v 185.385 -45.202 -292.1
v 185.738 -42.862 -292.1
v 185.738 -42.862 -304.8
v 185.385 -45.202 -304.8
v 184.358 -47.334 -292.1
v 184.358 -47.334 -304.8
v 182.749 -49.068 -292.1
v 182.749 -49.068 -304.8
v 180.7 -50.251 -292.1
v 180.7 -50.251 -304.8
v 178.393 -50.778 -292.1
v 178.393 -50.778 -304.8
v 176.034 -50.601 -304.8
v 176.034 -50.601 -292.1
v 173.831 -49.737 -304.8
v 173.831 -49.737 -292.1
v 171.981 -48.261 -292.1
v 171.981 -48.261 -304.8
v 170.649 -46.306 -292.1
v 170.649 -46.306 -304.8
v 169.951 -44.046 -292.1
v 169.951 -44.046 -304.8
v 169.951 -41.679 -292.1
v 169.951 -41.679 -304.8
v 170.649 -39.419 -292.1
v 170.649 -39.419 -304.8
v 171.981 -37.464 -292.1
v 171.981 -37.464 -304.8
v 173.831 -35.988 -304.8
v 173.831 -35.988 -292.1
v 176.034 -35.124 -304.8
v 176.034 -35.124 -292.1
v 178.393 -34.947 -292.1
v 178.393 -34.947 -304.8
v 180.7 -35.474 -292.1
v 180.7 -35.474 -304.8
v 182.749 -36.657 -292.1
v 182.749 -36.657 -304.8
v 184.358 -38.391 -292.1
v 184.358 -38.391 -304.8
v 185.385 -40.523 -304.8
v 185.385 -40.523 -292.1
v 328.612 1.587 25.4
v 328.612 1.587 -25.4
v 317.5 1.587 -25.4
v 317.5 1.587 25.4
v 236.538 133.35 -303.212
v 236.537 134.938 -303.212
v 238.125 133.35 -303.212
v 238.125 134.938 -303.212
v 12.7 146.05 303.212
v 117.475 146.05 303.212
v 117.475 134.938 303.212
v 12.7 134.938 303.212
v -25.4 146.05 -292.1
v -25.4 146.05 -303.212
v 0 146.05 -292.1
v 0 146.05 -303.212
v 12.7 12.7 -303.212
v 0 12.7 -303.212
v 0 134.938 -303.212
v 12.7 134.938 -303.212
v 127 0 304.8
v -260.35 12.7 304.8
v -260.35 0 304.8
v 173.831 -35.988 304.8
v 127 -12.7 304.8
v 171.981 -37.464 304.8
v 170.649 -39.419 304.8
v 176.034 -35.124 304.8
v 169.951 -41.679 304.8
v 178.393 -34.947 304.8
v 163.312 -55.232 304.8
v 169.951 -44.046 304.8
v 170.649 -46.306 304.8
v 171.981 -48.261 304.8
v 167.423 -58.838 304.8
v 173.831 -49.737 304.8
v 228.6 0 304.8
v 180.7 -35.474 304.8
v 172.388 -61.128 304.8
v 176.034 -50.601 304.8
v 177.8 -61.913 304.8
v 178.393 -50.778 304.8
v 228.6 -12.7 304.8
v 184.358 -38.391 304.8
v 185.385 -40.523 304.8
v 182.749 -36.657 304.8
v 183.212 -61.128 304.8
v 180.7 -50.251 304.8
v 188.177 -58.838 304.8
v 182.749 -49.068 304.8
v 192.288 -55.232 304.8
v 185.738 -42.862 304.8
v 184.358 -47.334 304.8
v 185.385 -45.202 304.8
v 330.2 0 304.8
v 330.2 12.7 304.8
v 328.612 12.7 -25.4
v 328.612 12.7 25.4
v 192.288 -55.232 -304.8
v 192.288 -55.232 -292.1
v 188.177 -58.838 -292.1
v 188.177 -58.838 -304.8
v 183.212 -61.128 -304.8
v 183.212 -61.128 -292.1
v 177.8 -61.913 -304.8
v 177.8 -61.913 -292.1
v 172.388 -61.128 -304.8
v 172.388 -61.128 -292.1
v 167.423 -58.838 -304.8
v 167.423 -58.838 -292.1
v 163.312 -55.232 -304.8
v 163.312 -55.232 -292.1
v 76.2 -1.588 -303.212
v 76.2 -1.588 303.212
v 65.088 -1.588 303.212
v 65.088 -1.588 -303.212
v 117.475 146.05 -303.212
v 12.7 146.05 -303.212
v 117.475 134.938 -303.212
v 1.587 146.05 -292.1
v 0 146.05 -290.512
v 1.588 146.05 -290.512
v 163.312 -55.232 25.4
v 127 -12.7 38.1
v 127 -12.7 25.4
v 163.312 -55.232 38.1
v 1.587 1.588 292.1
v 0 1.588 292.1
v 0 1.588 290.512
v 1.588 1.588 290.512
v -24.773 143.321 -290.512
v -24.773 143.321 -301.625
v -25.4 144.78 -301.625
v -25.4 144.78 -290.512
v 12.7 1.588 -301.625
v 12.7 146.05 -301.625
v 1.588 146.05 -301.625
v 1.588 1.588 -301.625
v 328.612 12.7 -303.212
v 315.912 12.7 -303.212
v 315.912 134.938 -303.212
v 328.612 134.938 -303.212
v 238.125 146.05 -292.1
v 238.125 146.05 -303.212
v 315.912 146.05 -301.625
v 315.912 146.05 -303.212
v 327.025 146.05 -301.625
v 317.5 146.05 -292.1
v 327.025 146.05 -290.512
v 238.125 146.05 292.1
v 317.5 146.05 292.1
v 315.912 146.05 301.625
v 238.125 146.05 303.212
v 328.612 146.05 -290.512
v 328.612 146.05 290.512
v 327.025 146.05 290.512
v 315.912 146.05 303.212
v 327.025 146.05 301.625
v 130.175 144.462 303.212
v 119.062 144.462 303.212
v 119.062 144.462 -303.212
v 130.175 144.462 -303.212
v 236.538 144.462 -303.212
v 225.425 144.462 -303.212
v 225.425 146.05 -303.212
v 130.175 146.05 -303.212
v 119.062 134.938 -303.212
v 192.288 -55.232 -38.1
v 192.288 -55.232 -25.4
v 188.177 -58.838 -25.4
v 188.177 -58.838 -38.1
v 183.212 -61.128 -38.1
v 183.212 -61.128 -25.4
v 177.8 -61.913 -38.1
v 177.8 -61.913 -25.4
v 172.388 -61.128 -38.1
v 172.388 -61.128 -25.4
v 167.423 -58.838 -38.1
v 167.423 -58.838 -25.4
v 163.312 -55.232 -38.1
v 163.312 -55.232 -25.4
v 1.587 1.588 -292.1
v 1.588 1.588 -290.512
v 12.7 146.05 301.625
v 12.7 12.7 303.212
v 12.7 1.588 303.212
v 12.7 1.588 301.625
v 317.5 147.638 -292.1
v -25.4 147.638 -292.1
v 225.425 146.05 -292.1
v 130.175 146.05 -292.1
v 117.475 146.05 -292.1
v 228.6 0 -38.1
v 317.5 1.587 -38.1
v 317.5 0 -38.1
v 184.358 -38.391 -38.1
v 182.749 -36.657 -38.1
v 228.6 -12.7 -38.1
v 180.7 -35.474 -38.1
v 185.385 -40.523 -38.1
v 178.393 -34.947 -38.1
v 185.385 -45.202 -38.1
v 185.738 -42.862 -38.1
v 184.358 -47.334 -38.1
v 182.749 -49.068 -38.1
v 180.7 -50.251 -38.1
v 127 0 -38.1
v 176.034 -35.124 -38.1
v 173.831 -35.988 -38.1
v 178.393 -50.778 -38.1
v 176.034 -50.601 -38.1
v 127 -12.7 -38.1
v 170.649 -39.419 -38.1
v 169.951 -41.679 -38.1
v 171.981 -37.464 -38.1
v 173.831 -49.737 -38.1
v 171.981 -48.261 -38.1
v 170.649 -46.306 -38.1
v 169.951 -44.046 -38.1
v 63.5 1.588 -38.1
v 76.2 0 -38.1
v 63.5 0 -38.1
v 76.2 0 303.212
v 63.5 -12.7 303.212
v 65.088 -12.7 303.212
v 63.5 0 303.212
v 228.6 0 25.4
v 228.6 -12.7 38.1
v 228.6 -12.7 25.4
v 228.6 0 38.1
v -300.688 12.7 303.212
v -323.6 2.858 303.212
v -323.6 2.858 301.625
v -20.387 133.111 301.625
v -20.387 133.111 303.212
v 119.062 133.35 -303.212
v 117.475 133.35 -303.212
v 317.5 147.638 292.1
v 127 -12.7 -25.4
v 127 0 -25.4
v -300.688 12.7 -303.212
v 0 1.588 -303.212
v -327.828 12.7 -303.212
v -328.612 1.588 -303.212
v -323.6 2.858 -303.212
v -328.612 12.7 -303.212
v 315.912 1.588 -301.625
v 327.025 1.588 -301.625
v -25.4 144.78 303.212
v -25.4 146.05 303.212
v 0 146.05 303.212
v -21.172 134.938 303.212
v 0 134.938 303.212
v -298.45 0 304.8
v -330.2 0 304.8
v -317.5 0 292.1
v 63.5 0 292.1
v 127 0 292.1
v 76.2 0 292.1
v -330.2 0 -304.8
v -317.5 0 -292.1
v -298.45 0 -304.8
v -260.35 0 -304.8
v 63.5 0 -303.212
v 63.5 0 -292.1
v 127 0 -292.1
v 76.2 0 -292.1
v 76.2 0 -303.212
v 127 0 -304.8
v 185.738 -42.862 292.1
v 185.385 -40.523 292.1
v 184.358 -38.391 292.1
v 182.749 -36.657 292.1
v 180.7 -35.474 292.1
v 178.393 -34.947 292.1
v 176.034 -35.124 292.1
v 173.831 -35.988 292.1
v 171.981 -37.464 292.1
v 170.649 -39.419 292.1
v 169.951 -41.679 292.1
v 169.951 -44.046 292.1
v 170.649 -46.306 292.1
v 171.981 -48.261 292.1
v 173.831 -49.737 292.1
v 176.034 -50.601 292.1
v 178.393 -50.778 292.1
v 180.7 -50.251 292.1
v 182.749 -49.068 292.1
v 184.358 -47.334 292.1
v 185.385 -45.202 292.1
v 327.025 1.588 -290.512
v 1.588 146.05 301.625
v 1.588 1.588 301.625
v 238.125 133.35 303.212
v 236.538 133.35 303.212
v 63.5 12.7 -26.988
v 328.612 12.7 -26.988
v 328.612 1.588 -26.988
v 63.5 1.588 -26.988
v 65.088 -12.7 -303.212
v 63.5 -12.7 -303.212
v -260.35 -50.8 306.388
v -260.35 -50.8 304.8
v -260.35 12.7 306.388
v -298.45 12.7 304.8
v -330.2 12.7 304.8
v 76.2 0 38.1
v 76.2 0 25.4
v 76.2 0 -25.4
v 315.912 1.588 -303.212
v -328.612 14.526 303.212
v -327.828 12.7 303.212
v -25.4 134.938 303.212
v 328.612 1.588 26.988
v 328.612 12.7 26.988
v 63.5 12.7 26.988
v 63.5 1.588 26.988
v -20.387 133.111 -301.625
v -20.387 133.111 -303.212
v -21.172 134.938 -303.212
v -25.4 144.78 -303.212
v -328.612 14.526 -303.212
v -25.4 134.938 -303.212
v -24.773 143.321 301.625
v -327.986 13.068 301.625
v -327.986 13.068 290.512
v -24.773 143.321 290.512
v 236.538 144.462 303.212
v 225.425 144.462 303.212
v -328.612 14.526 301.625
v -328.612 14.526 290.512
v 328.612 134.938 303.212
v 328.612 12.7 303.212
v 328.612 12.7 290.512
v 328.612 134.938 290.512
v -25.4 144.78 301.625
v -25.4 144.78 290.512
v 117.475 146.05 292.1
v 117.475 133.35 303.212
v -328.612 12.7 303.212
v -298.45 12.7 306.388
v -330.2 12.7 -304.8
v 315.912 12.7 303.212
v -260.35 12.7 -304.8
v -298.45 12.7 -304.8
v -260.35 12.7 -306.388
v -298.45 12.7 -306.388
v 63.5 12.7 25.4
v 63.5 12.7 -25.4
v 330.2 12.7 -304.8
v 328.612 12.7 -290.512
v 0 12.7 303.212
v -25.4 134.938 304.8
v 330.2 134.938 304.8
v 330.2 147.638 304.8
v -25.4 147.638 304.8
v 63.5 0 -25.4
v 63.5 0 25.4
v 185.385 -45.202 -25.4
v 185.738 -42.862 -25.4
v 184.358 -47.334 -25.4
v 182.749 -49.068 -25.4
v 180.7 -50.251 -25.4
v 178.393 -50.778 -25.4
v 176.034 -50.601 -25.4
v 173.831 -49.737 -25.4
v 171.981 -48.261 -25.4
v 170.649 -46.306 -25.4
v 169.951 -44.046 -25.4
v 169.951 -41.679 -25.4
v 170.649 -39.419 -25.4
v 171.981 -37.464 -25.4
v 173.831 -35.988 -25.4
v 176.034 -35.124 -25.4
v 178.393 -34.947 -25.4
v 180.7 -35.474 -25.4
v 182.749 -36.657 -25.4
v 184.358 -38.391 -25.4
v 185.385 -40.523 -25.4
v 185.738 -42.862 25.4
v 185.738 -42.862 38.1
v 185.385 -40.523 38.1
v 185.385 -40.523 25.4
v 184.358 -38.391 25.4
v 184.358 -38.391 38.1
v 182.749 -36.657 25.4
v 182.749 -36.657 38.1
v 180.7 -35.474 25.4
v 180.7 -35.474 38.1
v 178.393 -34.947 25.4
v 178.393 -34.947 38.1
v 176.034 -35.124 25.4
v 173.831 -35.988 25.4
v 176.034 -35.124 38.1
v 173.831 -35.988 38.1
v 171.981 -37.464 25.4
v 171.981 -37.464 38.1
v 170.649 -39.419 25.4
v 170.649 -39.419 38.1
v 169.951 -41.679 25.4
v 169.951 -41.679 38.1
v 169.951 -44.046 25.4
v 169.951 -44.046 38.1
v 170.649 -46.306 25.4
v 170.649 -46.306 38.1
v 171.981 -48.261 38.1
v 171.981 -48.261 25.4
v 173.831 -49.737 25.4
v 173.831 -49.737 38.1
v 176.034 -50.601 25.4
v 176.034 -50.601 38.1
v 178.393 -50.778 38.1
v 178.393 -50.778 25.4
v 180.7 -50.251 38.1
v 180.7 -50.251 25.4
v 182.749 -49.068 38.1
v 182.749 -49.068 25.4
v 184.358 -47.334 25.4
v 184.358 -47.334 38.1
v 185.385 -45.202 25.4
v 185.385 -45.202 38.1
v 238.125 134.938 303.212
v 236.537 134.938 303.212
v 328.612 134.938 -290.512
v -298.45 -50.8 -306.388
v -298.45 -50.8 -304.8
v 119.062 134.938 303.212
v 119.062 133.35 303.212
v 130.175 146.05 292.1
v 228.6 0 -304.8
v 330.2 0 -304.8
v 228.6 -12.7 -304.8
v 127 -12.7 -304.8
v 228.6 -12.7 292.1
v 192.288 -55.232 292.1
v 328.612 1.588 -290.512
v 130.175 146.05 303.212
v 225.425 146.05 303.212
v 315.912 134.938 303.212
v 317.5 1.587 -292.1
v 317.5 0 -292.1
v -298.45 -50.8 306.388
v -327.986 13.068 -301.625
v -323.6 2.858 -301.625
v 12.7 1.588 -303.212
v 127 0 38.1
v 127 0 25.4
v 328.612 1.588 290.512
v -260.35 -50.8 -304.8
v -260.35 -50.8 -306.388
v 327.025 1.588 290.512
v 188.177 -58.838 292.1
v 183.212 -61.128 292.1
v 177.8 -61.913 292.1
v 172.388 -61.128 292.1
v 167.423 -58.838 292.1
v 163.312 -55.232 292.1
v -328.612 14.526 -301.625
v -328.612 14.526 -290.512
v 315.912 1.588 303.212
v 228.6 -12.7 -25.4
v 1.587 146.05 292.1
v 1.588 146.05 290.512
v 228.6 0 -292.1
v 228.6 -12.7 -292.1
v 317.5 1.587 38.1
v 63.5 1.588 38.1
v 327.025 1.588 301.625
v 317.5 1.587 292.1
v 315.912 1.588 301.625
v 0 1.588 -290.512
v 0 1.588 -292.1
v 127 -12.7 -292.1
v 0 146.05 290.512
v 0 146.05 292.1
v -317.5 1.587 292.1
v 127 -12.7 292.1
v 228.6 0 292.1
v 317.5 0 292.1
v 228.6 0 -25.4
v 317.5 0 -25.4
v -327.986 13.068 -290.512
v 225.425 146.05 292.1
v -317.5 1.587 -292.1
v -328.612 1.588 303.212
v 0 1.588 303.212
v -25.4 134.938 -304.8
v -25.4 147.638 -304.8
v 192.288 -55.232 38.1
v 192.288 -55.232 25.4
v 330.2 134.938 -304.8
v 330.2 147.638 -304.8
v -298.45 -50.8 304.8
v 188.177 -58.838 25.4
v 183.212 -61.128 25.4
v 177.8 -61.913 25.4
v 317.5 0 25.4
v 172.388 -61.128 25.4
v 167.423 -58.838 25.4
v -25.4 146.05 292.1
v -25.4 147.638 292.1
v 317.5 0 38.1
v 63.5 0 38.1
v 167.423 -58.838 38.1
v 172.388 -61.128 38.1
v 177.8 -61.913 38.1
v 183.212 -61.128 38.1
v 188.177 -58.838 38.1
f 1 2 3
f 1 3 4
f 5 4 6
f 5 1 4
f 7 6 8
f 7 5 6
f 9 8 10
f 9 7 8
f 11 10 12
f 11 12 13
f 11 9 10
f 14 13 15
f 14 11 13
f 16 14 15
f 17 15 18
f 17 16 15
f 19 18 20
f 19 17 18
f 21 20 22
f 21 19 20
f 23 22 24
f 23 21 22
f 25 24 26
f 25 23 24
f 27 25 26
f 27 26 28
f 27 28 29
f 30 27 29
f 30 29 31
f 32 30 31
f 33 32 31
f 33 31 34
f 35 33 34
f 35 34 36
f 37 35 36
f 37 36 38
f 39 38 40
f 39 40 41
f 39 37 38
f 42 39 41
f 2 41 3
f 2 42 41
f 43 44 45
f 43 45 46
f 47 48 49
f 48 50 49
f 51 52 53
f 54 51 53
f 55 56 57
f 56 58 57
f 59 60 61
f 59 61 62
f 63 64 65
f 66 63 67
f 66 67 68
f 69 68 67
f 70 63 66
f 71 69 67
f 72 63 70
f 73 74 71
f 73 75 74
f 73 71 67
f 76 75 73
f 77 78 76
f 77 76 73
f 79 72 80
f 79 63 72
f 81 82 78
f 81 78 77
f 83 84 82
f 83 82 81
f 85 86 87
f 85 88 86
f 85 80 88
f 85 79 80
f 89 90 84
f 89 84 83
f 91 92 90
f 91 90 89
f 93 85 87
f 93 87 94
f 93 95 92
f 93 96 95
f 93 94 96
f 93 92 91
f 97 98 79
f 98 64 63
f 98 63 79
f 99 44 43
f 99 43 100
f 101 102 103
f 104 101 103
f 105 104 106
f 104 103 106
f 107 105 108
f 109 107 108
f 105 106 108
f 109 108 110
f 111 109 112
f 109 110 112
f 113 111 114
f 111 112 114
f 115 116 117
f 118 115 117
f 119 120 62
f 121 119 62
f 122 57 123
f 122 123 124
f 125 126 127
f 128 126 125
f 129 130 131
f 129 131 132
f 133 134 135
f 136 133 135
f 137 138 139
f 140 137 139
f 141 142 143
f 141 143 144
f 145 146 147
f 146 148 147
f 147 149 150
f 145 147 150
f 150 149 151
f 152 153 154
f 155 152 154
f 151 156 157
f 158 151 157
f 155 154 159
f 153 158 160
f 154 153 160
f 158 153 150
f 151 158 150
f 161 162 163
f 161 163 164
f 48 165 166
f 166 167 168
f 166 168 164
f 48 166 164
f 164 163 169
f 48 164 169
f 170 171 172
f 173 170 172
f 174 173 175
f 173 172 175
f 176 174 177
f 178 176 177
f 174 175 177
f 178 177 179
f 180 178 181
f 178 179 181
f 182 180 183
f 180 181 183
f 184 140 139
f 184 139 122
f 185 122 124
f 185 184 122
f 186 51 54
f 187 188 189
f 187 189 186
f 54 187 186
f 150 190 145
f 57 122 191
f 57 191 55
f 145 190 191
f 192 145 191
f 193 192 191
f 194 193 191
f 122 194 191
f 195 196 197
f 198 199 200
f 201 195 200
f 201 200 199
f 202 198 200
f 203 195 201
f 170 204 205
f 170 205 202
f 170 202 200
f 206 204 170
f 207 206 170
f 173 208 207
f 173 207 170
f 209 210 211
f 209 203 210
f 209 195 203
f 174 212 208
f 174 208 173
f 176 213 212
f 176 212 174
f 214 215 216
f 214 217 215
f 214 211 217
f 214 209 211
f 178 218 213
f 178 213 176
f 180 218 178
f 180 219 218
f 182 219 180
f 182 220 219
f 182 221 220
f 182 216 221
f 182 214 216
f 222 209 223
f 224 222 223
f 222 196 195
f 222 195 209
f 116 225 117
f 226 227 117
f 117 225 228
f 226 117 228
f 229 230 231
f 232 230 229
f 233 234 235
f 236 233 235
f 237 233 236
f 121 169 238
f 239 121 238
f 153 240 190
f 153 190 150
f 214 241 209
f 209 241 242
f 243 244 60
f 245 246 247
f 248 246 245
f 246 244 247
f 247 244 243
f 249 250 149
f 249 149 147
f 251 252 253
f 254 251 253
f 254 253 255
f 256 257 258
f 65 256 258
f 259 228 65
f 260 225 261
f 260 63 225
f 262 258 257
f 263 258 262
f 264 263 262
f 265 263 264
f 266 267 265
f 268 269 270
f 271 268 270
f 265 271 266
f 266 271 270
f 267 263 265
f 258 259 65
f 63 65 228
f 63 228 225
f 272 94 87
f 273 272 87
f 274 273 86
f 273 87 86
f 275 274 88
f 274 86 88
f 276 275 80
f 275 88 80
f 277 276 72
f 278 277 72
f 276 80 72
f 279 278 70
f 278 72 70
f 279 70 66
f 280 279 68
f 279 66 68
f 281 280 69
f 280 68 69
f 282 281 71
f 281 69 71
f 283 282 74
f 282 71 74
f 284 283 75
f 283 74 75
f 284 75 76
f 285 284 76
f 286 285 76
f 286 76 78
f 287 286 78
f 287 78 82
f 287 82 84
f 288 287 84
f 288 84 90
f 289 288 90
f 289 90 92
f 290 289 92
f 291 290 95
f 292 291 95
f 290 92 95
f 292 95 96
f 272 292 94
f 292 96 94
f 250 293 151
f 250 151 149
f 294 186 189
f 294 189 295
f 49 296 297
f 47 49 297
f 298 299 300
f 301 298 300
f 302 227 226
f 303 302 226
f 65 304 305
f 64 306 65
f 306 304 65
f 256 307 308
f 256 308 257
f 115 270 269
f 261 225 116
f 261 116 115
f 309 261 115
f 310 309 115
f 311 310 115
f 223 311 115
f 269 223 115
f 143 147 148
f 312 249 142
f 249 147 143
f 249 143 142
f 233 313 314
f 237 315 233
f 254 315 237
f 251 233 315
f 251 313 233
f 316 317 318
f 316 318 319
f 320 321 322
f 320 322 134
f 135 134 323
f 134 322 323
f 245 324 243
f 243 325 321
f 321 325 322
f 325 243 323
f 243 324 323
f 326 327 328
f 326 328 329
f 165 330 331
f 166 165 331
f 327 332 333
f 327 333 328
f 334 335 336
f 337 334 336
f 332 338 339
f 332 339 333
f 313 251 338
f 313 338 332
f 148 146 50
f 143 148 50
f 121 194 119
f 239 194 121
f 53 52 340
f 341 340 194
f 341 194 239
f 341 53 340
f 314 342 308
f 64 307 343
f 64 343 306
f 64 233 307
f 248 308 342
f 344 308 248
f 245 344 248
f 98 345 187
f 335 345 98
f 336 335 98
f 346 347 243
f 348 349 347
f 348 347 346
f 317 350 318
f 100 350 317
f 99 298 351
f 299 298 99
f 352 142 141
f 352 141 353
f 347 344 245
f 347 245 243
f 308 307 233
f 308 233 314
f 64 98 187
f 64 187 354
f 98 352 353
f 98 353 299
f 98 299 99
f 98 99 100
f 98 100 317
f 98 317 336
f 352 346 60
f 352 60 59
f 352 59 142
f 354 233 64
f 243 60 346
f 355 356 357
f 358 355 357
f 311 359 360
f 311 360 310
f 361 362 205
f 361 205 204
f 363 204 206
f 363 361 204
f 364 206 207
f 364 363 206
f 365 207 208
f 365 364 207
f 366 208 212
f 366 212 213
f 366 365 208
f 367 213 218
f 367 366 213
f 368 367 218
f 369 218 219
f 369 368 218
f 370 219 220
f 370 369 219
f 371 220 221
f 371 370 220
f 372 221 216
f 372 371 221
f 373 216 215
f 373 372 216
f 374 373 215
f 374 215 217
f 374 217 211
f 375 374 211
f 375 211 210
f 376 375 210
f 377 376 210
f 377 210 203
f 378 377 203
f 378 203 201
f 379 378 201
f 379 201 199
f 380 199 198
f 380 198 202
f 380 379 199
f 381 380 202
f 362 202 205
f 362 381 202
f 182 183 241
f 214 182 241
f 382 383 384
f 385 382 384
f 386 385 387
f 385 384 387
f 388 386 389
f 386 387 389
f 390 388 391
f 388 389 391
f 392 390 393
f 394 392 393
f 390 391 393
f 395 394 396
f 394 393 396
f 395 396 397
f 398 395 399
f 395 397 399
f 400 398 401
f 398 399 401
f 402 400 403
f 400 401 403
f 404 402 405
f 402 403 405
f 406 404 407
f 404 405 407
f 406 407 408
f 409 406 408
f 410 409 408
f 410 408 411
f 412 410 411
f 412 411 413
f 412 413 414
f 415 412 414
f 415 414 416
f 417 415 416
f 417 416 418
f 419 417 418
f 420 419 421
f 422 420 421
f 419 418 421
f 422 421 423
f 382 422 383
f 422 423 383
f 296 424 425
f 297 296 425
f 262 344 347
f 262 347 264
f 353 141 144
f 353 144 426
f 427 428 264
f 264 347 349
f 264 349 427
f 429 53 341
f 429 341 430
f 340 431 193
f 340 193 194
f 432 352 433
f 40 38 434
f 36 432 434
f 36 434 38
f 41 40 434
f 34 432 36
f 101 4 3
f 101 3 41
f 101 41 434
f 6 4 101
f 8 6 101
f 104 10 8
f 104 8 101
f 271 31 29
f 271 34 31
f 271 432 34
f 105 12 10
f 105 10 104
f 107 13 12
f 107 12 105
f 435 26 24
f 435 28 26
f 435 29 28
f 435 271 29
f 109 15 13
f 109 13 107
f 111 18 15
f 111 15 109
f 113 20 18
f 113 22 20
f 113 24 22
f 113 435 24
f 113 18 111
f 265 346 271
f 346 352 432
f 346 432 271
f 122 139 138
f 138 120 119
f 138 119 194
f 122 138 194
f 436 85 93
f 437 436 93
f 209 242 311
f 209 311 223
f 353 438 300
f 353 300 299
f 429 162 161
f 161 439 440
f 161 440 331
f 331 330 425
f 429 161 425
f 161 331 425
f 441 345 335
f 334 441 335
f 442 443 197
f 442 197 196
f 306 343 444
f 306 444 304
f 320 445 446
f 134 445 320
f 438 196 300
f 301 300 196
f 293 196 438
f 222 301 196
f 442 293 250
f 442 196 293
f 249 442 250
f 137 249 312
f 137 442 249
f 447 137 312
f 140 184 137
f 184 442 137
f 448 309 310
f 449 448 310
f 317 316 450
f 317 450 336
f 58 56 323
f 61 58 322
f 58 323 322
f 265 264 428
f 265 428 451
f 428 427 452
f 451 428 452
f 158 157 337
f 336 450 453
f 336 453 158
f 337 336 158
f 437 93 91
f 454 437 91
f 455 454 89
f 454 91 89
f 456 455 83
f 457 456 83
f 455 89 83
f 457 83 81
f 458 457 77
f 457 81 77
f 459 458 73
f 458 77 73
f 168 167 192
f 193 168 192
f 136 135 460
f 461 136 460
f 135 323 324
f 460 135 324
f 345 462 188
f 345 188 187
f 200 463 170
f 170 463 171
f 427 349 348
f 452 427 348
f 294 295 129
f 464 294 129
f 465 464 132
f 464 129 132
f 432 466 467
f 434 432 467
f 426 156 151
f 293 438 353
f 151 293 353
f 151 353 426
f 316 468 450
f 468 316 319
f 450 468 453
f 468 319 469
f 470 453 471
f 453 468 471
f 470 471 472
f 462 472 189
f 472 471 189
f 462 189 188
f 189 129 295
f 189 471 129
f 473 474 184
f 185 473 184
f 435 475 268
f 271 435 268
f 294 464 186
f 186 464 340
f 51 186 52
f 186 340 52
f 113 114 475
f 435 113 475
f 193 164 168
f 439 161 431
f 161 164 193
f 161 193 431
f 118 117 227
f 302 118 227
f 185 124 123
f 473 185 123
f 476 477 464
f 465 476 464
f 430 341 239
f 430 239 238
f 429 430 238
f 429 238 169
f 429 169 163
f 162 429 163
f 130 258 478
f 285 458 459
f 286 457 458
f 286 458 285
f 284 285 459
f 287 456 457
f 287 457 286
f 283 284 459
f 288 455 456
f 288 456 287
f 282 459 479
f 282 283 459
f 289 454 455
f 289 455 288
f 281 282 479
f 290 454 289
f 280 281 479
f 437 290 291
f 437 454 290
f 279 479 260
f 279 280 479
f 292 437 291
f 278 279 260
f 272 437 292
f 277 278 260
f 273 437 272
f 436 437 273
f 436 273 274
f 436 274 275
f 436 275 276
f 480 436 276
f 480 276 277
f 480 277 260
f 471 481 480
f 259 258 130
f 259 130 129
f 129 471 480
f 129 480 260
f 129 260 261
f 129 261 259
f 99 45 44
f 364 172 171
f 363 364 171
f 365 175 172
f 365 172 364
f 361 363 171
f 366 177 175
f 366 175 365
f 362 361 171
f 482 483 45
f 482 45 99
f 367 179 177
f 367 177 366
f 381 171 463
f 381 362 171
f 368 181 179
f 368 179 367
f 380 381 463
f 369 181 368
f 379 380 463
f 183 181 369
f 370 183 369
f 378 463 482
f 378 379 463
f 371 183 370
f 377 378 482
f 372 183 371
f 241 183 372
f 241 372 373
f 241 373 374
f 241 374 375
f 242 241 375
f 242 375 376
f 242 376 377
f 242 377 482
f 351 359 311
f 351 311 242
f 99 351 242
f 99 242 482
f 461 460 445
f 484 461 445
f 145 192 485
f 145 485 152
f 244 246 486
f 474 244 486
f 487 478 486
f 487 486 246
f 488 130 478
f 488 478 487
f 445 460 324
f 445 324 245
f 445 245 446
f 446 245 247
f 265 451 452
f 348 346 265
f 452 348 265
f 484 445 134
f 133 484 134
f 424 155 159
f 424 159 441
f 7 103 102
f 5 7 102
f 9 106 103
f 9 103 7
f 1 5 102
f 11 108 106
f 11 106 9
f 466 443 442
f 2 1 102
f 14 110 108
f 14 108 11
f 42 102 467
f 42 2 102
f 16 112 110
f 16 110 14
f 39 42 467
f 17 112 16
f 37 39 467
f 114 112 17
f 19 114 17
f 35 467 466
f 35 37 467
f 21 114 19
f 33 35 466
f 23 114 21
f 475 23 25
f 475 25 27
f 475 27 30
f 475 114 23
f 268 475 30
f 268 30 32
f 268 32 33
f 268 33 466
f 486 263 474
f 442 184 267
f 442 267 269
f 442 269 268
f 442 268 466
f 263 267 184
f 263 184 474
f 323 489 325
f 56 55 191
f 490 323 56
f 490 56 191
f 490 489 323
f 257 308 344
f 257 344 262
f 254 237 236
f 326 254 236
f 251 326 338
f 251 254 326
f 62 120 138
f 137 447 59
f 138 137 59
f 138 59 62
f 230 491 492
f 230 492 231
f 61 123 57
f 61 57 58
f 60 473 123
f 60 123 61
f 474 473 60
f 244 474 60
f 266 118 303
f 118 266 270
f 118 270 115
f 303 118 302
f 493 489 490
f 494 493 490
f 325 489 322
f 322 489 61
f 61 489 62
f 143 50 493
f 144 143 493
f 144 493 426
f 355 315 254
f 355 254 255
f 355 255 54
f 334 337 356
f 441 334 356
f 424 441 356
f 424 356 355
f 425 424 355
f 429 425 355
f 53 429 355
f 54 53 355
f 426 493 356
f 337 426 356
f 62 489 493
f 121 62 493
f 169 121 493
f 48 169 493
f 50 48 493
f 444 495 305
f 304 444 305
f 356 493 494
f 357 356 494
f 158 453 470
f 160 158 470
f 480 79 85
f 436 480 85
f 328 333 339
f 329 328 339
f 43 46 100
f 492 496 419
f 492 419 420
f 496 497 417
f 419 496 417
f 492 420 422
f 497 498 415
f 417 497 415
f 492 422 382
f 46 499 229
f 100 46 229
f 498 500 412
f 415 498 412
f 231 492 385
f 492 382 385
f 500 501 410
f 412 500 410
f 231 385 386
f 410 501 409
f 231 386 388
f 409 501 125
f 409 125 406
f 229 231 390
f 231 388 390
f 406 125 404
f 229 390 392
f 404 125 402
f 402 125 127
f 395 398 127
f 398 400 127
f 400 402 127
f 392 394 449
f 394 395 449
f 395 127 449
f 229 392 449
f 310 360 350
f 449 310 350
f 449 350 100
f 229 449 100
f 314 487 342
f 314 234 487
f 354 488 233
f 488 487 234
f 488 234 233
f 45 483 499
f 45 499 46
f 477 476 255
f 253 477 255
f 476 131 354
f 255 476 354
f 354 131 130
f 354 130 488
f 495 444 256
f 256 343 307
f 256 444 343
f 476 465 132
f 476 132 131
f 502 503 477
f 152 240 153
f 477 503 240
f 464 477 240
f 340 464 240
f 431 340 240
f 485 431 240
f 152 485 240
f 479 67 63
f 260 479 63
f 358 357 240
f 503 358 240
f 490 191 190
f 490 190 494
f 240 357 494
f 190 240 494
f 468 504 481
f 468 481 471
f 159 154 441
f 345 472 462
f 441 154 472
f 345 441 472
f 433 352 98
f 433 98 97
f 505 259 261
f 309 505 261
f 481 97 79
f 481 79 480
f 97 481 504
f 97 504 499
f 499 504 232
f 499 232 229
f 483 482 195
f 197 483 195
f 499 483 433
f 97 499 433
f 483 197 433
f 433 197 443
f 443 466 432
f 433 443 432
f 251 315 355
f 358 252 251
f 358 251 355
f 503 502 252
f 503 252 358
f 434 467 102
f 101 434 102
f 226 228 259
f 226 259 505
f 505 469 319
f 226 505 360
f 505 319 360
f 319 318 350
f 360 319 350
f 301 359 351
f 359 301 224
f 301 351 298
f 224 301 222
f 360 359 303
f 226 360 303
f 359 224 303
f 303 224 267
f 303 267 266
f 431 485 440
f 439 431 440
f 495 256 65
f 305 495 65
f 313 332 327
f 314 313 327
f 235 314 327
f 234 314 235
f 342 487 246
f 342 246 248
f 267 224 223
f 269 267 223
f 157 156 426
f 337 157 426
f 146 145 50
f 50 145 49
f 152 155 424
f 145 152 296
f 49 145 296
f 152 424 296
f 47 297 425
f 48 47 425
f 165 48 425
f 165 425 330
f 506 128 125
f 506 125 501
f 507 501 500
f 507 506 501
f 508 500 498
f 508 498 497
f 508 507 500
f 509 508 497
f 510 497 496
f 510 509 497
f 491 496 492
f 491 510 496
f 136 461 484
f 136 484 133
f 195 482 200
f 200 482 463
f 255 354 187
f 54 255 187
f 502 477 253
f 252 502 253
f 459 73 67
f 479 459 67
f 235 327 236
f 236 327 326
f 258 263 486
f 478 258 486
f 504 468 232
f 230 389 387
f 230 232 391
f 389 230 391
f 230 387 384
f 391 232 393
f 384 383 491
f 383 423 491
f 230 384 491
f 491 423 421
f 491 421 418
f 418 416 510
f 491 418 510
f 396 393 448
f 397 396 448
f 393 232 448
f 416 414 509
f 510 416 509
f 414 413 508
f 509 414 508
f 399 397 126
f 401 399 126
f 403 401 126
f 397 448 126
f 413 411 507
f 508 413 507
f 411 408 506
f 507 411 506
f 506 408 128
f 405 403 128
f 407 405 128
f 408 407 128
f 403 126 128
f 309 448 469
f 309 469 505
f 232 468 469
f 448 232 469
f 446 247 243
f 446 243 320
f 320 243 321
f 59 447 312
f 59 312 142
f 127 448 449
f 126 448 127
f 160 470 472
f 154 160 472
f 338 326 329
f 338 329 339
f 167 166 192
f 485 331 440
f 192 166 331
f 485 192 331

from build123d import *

# Parameters (mm, degrees)
BOSS_EXTRUDE4_DEPTH  = 144.4625
BOSS_EXTRUDE5_REACH  = 709.466
BOSS_EXTRUDE6_START  = 304.8
SKETCH8_R            = 7.9375
BOSS_EXTRUDE6_DEPTH  = 12.7
BOSS_EXTRUDE11_START = -12.7
SKETCH11_R           = 7.9375
BOSS_EXTRUDE11_DEPTH = 12.7
BOSS_EXTRUDE12_REACH = 521.326
BOSS_EXTRUDE15_START = -12.7
SKETCH13_R           = 7.9375
BOSS_EXTRUDE15_DEPTH = 12.7
SKETCH14_R           = 7.9375
BOSS_EXTRUDE16_DEPTH = 12.7
SKETCH15_W           = 38.1
SKETCH15_H           = 1.5875
BOSS_EXTRUDE17_DEPTH = 63.5
CUT_EXTRUDE1_REACH   = 712.196
SKETCH18_W           = 304.8
SKETCH18_H           = 12.7
BOSS_EXTRUDE21_DEPTH = 1.5875
BOSS_EXTRUDE23_DEPTH = 12.7


with BuildPart() as part:
    # Sweep1: sweep along a path in Sketch1
    with BuildLine(Plane(origin=(0, 0, 0), x_dir=(1, 0, 0), z_dir=(0, 1, 0))) as sweep1_path:
        Line((-330.2, -304.8), (330.2, -304.8))
        Line((330.2, -304.8), (330.2, 304.8))
        Line((330.2, 304.8), (-330.2, 304.8))
        Line((-330.2, 304.8), (-330.2, -304.8))
    # Sketch2 → Sweep1 (sweep)
    with BuildSketch(Plane(origin=(0, 0, 0), x_dir=(0, 0, -1), z_dir=(1, 0, 0))):
        Polygon((-304.8, 0), (-292.1, 0), (-292.1, 1.5875), (-303.2125, 1.5875), (-303.2125, 12.7), (-304.8, 12.7), align=None)
    sweep(path=sweep1_path.line, transition=Transition.RIGHT)



with BuildPart() as body_2:
    # Sweep2: sweep along a path in Sketch4
    with BuildLine(Plane(origin=(0, 147.6375, 0), x_dir=(1, 0, 0), z_dir=(0, 1, 0))) as sweep2_path:
        Line((-330.2, -304.8), (330.2, -304.8))
        Line((330.2, -304.8), (330.2, 304.8))
        Line((330.2, 304.8), (-330.2, 304.8))
        Line((-330.2, 304.8), (-330.2, -304.8))
    # Sketch5 → Sweep2 (sweep)
    with BuildSketch(Plane(origin=(0, 0, 0), x_dir=(0, 0, -1), z_dir=(1, 0, 0))):
        Polygon((304.8, 147.6375), (304.8, 134.9375), (303.2125, 134.9375), (303.2125, 146.05), (292.1, 146.05), (292.1, 147.6375), align=None)
    sweep(path=sweep2_path.line, transition=Transition.RIGHT)


with BuildPart() as part_1:
    add(part.part)

    add(body_2.part)  # Boss-Extrude4 merges body 2
    # Sketch6 → Boss-Extrude4 (add)
    with BuildSketch(Plane(origin=(0, 1.5875, 0), x_dir=(1, 0, 0), z_dir=(0, 1, 0))):
        Polygon((315.9125, -303.2125), (328.6125, -303.2125), (328.6125, -290.5125), (327.025, -290.5125), (327.025, -301.625), (315.9125, -301.625), align=None)
        Polygon((12.7, -303.2125), (12.7, -301.625), (1.5875, -301.625), (1.5875, -290.5125), (0, -290.5125), (0, -303.2125), align=None)
    boss_extrude4 = extrude(amount=BOSS_EXTRUDE4_DEPTH)

    # Mirror1: Boss-Extrude4 across plane
    add(boss_extrude4.mirror(Plane.XY))

    # Boss-Extrude5: up to this face of the body (flat: up to its plane)
    boss_extrude5_end = Plane(part_1.part.faces().sort_by_distance((-164.30625, 140.49375, -303.2125))[0])
    # Sketch7 → Boss-Extrude5 (add, up to the picked face)
    with BuildSketch(Plane(origin=(0, 0, 303.2125), x_dir=(-1, 0, 0), z_dir=(0, 0, -1)), mode=Mode.PRIVATE) as boss_extrude5_sk1:
        Polygon((-238.125, 146.05), (-238.125, 133.35), (-236.5375, 133.35), (-236.5375, 144.4625), (-225.425, 144.4625), (-225.425, 146.05), align=None)
    boss_extrude5_tool1 = split(extrude(boss_extrude5_sk1.sketch, amount=BOSS_EXTRUDE5_REACH, mode=Mode.PRIVATE), bisect_by=boss_extrude5_end, keep=Keep.BOTH, mode=Mode.PRIVATE)
    # Sketch7 → Boss-Extrude5 (add, up to the picked face)
    with BuildSketch(Plane(origin=(0, 0, 303.2125), x_dir=(-1, 0, 0), z_dir=(0, 0, -1)), mode=Mode.PRIVATE) as boss_extrude5_sk2:
        Polygon((-130.175, 146.05), (-117.475, 146.05), (-117.475, 133.35), (-119.0625, 133.35), (-119.0625, 144.4625), (-130.175, 144.4625), align=None)
    boss_extrude5_tool2 = split(extrude(boss_extrude5_sk2.sketch, amount=BOSS_EXTRUDE5_REACH, mode=Mode.PRIVATE), bisect_by=boss_extrude5_end, keep=Keep.BOTH, mode=Mode.PRIVATE)
    # Sketch7 → Boss-Extrude5 (add, up to the picked face)
    with BuildSketch(Plane(origin=(0, 0, 303.2125), x_dir=(-1, 0, 0), z_dir=(0, 0, -1)), mode=Mode.PRIVATE) as boss_extrude5_sk3:
        Polygon((-76.2, 0), (-76.2, -1.5875), (-65.0875, -1.5875), (-65.0875, -12.7), (-63.5, -12.7), (-63.5, 0), align=None)
    boss_extrude5_tool3 = split(extrude(boss_extrude5_sk3.sketch, amount=BOSS_EXTRUDE5_REACH, mode=Mode.PRIVATE), bisect_by=boss_extrude5_end, keep=Keep.BOTH, mode=Mode.PRIVATE)
    add(boss_extrude5_tool1.solids().sort_by(Axis((237.945395, 139.7, 303.2125), (0, 0, -1)))[0])
    add(boss_extrude5_tool2.solids().sort_by(Axis((123.825, 145.870395, 303.2125), (0, 0, -1)))[0])
    add(boss_extrude5_tool3.solids().sort_by(Axis((76.020395, -0.79375, 303.2125), (0, 0, -1)))[0])

    # Sketch8 → Boss-Extrude6 (add)
    with BuildSketch(Plane.XY.offset(BOSS_EXTRUDE6_START)):
        with BuildLine():
            Line((127, -12.7), (127, 0))
            Line((127, 0), (228.6, 0))
            Line((228.6, 0), (228.6, -12.7))
            Line((228.6, -12.7), (192.288023852, -55.23180333))
            ThreePointArc((192.288023852, -55.23180333), (177.8, -61.9125), (163.311976148, -55.23180333))
            Line((163.311976148, -55.23180333), (127, -12.7))
        make_face()
        with Locations((177.8, -42.8625)):
            Circle(SKETCH8_R, mode=Mode.SUBTRACT)
    extrude(amount=-BOSS_EXTRUDE6_DEPTH)

    # Sketch11 → Boss-Extrude11 (add)
    with BuildSketch(Plane(origin=(0, 0, -304.8), x_dir=(-1, 0, 0), z_dir=(0, 0, -1)).offset(BOSS_EXTRUDE11_START)):
        with BuildLine():
            Line((-127, -12.7), (-127, 0))
            Line((-127, 0), (-228.6, 0))
            Line((-228.6, 0), (-228.6, -12.7))
            Line((-228.6, -12.7), (-192.288023852, -55.23180333))
            ThreePointArc((-192.288023852, -55.23180333), (-177.8, -61.9125), (-163.311976148, -55.23180333))
            Line((-163.311976148, -55.23180333), (-127, -12.7))
        make_face()
        with Locations(Location((-177.8, -42.8625, 0), (0, 0, 180))):
            Circle(SKETCH11_R, mode=Mode.SUBTRACT)
    extrude(amount=BOSS_EXTRUDE11_DEPTH)

    # Boss-Extrude12: up to this face of the body (flat: up to its plane)
    boss_extrude12_end = Plane(part_1.part.faces().sort_by_distance((328.6125, 7.14375, 0))[0])
    # Sketch12 → Boss-Extrude12 (add, up to the picked face)
    with BuildSketch(Plane.ZY.offset(-63.5), mode=Mode.PRIVATE) as boss_extrude12_sk1:
        Polygon((-25.4, 0), (-25.4, 12.7), (-26.9875, 12.7), (-26.9875, 1.5875), (-38.1, 1.5875), (-38.1, 0), align=None)
    boss_extrude12_tool1 = split(extrude(boss_extrude12_sk1.sketch, amount=-BOSS_EXTRUDE12_REACH, mode=Mode.PRIVATE), bisect_by=boss_extrude12_end, keep=Keep.BOTH, mode=Mode.PRIVATE)
    # Sketch12 → Boss-Extrude12 (add, up to the picked face)
    with BuildSketch(Plane.ZY.offset(-63.5), mode=Mode.PRIVATE) as boss_extrude12_sk2:
        Polygon((25.4, 0), (25.4, 12.7), (26.9875, 12.7), (26.9875, 1.5875), (38.1, 1.5875), (38.1, 0), align=None)
    boss_extrude12_tool2 = split(extrude(boss_extrude12_sk2.sketch, amount=-BOSS_EXTRUDE12_REACH, mode=Mode.PRIVATE), bisect_by=boss_extrude12_end, keep=Keep.BOTH, mode=Mode.PRIVATE)
    add(boss_extrude12_tool1.solids().sort_by(Axis((63.5, 6.35, -25.579605), (1, 0, 0)))[0])
    add(boss_extrude12_tool2.solids().sort_by(Axis((63.5, 6.35, 25.579605), (1, 0, 0)))[0])

    # Sketch13 → Boss-Extrude15 (add)
    with BuildSketch(Plane(origin=(0, 0, -38.1), x_dir=(-1, 0, 0), z_dir=(0, 0, -1)).offset(BOSS_EXTRUDE15_START)):
        with BuildLine():
            Line((-127, 0), (-228.6, 0))
            Line((-228.6, 0), (-228.6, -12.7))
            Line((-228.6, -12.7), (-192.288023852, -55.23180333))
            ThreePointArc((-192.288023852, -55.23180333), (-177.8, -61.9125), (-163.311976148, -55.23180333))
            Line((-163.311976148, -55.23180333), (-127, -12.7))
            Line((-127, -12.7), (-127, 0))
        make_face()
        with Locations(Location((-177.8, -42.8625, 0), (0, 0, 180))):
            Circle(SKETCH13_R, mode=Mode.SUBTRACT)
    extrude(amount=BOSS_EXTRUDE15_DEPTH)

    # Sketch14 → Boss-Extrude16 (add)
    with BuildSketch(Plane.XY.offset(38.1)):
        with BuildLine():
            Line((228.6, -12.7), (228.6, 0))
            Line((228.6, 0), (127, 0))
            Line((127, 0), (127, -12.7))
            Line((127, -12.7), (163.311976148, -55.23180333))
            ThreePointArc((163.311976148, -55.23180333), (177.8, -61.9125), (192.288023852, -55.23180333))
            Line((192.288023852, -55.23180333), (228.6, -12.7))
        make_face()
        with Locations((177.8, -42.8625)):
            Circle(SKETCH14_R, mode=Mode.SUBTRACT)
    extrude(amount=-BOSS_EXTRUDE16_DEPTH)

    # Sketch15 → Boss-Extrude17 (add)
    with BuildSketch(Plane(origin=(0, 12.7, 0), x_dir=(1, 0, 0), z_dir=(0, 1, 0))):
        with Locations((-279.4, 305.59375)):
            Rectangle(SKETCH15_W, SKETCH15_H)
        with Locations((-279.4, -305.59375)):
            Rectangle(SKETCH15_W, SKETCH15_H)
    extrude(amount=-BOSS_EXTRUDE17_DEPTH)

    # Cut-Extrude1: up to this face of the body (flat: up to its plane)
    cut_extrude1_end = Plane(part_1.part.faces().sort_by_distance((0, 141.2875, 304.8))[0])
    # Sketch18 → Cut-Extrude1 (cut, up to the picked face)
    with BuildSketch(Plane(origin=(0, 0, -304.8), x_dir=(-1, 0, 0), z_dir=(0, 0, -1)), mode=Mode.PRIVATE) as cut_extrude1_sk1:
        with Locations((177.8, 141.2875)):
            Rectangle(SKETCH18_W, SKETCH18_H)
    cut_extrude1_tool1 = split(extrude(cut_extrude1_sk1.sketch, amount=-CUT_EXTRUDE1_REACH, mode=Mode.PRIVATE), bisect_by=cut_extrude1_end, keep=Keep.BOTH, mode=Mode.PRIVATE)
    add(cut_extrude1_tool1.solids().sort_by(Axis((-177.8, 141.2875, -304.8), (0, 0, 1)))[0], mode=Mode.SUBTRACT)

    # Sketch19 → Boss-Extrude21 (add)
    with BuildSketch(Plane.XY.offset(-303.2125)):
        Polygon((-25.4, 144.78), (-328.6125, 14.526382188), (-323.599797289, 2.8575), (-20.387297289, 133.111117812), align=None)
    boss_extrude21 = extrude(amount=BOSS_EXTRUDE21_DEPTH)

    # Sketch20 → Boss-Extrude23 (add)
    with BuildSketch(Plane(origin=(0, 0, -303.2125), x_dir=(-1, 0, 0), z_dir=(0, 0, -1))):
        Polygon((25.4, 144.78), (328.6125, 14.526382188), (327.985912161, 13.067771915), (24.773412161, 143.321389726), align=None)
    boss_extrude23 = extrude(amount=-BOSS_EXTRUDE23_DEPTH)

    # Mirror2: Boss-Extrude21, Boss-Extrude23 across plane
    add(boss_extrude21.mirror(Plane.XY))
    add(boss_extrude23.mirror(Plane.XY))


solid = part_1.part
